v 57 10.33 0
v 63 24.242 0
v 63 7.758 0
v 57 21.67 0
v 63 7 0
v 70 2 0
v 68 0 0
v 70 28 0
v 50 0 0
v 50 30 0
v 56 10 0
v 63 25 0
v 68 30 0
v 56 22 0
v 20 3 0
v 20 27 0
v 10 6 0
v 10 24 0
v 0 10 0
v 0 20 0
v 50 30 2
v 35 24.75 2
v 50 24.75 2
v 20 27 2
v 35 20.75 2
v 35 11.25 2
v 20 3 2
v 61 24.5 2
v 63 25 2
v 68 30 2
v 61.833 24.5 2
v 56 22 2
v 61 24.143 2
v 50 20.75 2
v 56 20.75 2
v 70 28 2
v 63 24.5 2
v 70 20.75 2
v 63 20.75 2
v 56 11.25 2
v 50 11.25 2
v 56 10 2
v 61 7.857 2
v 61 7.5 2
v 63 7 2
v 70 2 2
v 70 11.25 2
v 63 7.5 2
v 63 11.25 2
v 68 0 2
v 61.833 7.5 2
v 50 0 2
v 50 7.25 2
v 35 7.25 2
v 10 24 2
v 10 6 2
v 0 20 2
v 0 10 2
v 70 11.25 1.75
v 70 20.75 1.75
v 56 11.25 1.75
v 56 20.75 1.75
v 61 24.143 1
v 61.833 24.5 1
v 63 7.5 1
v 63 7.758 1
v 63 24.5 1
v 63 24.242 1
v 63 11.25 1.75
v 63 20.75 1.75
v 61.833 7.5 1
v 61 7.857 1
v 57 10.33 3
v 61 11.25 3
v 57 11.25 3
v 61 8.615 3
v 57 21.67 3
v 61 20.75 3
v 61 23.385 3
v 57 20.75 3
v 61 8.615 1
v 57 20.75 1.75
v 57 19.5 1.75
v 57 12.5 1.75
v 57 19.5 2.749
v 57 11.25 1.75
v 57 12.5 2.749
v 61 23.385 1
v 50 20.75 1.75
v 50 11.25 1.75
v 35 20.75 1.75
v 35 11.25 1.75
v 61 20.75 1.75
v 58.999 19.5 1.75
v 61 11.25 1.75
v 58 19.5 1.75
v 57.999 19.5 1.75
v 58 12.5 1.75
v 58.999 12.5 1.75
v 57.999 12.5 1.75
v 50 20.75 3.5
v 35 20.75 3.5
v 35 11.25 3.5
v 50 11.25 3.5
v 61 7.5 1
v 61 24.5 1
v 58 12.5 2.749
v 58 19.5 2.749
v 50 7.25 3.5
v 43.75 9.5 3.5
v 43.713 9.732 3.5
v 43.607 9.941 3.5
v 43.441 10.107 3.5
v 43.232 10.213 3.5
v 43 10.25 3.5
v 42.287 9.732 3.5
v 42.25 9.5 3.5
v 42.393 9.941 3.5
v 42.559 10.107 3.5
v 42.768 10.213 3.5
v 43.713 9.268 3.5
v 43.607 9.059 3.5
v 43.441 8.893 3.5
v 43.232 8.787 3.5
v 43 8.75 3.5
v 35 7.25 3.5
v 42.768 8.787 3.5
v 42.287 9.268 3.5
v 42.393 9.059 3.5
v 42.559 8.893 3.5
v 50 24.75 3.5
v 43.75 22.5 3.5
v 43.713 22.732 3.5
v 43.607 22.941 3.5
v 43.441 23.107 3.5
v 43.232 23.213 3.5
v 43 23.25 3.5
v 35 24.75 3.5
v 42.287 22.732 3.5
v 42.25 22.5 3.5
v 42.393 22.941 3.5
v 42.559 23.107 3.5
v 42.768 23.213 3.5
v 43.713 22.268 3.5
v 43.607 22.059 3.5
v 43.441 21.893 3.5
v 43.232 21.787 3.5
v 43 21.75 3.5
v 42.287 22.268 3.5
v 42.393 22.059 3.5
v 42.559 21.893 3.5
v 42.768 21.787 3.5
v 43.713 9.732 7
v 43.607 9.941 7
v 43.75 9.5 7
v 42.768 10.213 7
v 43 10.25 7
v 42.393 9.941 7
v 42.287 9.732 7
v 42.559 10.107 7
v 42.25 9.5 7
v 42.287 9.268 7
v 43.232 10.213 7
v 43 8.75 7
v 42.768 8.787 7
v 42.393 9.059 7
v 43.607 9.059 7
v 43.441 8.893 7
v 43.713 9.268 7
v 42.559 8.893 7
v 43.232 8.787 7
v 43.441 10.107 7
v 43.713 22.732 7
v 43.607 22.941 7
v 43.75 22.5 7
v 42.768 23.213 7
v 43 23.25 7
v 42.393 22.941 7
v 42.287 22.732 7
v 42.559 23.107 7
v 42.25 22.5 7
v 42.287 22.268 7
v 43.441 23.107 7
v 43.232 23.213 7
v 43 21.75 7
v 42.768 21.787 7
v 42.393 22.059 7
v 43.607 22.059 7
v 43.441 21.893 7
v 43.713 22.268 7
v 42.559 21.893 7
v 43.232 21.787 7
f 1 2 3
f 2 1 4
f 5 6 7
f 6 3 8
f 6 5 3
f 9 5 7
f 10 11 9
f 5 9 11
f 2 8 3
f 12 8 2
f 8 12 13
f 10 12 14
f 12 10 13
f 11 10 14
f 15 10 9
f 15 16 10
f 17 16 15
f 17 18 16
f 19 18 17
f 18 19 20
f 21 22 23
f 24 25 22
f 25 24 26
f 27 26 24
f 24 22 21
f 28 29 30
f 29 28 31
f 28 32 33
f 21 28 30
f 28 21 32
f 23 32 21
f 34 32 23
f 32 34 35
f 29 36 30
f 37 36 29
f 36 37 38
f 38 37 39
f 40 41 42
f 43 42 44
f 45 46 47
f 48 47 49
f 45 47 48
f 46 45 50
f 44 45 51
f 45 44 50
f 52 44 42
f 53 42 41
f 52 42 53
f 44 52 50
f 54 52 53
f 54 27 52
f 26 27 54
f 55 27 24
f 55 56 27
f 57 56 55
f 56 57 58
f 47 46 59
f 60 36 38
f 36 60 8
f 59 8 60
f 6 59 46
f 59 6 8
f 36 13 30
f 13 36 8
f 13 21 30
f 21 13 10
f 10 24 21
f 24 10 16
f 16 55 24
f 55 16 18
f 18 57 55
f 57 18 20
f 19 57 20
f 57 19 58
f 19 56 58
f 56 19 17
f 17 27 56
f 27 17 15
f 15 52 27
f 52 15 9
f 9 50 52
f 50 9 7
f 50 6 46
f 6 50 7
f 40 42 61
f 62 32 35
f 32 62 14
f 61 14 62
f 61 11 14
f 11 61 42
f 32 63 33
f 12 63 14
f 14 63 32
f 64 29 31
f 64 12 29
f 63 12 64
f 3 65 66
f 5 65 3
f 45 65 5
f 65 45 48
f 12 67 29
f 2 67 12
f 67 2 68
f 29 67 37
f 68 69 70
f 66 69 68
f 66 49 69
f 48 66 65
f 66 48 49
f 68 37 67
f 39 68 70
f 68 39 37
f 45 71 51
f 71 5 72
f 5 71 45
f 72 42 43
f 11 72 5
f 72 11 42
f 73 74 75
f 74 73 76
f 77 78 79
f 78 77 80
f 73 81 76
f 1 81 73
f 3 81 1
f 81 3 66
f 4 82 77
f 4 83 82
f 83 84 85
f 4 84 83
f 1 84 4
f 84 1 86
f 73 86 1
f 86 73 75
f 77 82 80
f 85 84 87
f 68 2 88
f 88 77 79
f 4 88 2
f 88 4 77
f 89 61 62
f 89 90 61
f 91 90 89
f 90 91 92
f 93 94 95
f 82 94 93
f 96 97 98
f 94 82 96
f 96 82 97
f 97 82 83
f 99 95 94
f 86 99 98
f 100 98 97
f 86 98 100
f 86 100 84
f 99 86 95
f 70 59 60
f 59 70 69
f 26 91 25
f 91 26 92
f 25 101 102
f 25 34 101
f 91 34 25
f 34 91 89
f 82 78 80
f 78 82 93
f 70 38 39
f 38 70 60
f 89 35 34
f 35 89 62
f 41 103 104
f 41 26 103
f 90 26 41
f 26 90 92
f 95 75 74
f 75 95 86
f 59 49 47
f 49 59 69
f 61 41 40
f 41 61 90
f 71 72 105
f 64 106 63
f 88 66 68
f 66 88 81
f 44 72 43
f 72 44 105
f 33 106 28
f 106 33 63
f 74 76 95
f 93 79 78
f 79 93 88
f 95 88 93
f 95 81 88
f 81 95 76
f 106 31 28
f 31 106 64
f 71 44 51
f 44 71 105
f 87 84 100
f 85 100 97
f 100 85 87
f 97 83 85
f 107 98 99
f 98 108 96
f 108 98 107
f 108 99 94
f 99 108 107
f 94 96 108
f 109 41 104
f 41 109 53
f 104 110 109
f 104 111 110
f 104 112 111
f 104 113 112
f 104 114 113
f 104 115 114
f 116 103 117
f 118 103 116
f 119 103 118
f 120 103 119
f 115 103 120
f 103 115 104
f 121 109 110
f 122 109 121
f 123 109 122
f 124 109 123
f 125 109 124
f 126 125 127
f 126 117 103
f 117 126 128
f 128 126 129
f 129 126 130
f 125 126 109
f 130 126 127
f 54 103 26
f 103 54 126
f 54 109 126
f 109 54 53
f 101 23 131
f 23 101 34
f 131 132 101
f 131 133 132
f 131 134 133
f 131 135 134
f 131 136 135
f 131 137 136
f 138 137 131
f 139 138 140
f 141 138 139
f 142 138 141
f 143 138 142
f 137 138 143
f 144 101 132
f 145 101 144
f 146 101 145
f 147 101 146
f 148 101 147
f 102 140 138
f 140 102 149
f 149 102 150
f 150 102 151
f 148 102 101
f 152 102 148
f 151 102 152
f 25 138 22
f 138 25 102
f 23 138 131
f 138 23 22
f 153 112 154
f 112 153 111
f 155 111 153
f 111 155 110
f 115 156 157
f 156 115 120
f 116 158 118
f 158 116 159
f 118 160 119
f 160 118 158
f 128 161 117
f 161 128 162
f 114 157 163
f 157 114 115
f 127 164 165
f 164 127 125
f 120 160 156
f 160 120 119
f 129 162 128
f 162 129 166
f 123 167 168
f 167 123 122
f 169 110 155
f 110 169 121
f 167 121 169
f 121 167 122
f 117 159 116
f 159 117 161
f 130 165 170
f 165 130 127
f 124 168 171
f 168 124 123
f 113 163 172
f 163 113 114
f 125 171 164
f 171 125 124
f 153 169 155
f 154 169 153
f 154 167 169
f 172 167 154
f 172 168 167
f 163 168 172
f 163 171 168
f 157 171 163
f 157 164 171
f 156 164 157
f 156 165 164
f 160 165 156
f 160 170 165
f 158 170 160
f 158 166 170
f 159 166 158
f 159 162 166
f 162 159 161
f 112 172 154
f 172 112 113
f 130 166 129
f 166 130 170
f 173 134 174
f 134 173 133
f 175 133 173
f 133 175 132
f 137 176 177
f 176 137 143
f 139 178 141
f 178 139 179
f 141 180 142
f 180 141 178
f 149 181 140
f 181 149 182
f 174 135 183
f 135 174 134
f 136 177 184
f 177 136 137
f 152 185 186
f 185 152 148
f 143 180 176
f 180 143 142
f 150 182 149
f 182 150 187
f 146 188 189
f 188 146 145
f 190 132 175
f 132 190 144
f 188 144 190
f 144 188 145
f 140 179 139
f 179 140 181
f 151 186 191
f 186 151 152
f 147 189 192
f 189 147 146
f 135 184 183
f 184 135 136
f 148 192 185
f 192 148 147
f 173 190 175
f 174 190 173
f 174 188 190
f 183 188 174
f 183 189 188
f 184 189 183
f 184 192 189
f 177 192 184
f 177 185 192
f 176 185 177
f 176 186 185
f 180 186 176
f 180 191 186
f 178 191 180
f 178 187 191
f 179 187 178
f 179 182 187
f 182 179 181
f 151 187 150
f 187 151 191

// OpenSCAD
//due to use of offset() function, requires OpenSCAD 2015.03 or later

// In order to fit the backband, this piece needs to be cylindrically
// deformed before printing.
// I do this in MeshLab using
//  Filters->Smoothing, Fairing and Deformation->Geometric Function
// and then entering in z+sqrt(8100-(x-35)^2)+90 for the z function

bodyPolygon = [[0,10],[0,20],[10,24],[20,27],[30,28],[40,29],[50,30],[68,30],[70,28],
[70,2],[68,0],[50,0],[40,1],[30,2],[20,3],[10,6],
[56,10],[63,7],[63,25],[56,22]];

union() {
    difference() {
        union() {
            //body
            linear_extrude(2) {
                polygon(points = bodyPolygon, paths = [[0,1,2,3,4,5,6,7,8,9,10,11,12,13,14,15],[16,17,18,19]]);
            }
            //flap
            linear_extrude(3) {
                translate([0.5,0,0])
                offset(-0.5)
                polygon(points = [bodyPolygon[16],bodyPolygon[17],bodyPolygon[18],bodyPolygon[19]]);
            }
        }
        union() {
            //strap track
            translate([35,11.25,1.75]) cube([48,9.5,2]);
            //flex gap
            translate([61,7.5,1]) cube([2,17,2]);
        }
    }
    
    
    //mounting pads
    translate([35,7.25,0]) {
        cube([15,4,3.5]);
    }
    translate([35,20.75,0]) {
        cube([15,4,3.5]);
    }
    
    //mounting posts
    translate([43,9.5,0]) {
        cylinder(r=0.75,h=7,$fn=20);
    }
    translate([43,22.5,0]) {
        cylinder(r=0.75,h=7,$fn=20);
    }
    
    //teeth (z should be 2.75, reduced slightly to eliminate warning
    translate([57,12.5,2.749])
    rotate([-90,0,0]) {
        linear_extrude(7) {
            polygon(points = [[0,0],[0,1],[1,1]]);
        }
        linear_extrude(7) {
            polygon(points = [[1,0],[1,1],[2,1]]);
        }
    }
}
